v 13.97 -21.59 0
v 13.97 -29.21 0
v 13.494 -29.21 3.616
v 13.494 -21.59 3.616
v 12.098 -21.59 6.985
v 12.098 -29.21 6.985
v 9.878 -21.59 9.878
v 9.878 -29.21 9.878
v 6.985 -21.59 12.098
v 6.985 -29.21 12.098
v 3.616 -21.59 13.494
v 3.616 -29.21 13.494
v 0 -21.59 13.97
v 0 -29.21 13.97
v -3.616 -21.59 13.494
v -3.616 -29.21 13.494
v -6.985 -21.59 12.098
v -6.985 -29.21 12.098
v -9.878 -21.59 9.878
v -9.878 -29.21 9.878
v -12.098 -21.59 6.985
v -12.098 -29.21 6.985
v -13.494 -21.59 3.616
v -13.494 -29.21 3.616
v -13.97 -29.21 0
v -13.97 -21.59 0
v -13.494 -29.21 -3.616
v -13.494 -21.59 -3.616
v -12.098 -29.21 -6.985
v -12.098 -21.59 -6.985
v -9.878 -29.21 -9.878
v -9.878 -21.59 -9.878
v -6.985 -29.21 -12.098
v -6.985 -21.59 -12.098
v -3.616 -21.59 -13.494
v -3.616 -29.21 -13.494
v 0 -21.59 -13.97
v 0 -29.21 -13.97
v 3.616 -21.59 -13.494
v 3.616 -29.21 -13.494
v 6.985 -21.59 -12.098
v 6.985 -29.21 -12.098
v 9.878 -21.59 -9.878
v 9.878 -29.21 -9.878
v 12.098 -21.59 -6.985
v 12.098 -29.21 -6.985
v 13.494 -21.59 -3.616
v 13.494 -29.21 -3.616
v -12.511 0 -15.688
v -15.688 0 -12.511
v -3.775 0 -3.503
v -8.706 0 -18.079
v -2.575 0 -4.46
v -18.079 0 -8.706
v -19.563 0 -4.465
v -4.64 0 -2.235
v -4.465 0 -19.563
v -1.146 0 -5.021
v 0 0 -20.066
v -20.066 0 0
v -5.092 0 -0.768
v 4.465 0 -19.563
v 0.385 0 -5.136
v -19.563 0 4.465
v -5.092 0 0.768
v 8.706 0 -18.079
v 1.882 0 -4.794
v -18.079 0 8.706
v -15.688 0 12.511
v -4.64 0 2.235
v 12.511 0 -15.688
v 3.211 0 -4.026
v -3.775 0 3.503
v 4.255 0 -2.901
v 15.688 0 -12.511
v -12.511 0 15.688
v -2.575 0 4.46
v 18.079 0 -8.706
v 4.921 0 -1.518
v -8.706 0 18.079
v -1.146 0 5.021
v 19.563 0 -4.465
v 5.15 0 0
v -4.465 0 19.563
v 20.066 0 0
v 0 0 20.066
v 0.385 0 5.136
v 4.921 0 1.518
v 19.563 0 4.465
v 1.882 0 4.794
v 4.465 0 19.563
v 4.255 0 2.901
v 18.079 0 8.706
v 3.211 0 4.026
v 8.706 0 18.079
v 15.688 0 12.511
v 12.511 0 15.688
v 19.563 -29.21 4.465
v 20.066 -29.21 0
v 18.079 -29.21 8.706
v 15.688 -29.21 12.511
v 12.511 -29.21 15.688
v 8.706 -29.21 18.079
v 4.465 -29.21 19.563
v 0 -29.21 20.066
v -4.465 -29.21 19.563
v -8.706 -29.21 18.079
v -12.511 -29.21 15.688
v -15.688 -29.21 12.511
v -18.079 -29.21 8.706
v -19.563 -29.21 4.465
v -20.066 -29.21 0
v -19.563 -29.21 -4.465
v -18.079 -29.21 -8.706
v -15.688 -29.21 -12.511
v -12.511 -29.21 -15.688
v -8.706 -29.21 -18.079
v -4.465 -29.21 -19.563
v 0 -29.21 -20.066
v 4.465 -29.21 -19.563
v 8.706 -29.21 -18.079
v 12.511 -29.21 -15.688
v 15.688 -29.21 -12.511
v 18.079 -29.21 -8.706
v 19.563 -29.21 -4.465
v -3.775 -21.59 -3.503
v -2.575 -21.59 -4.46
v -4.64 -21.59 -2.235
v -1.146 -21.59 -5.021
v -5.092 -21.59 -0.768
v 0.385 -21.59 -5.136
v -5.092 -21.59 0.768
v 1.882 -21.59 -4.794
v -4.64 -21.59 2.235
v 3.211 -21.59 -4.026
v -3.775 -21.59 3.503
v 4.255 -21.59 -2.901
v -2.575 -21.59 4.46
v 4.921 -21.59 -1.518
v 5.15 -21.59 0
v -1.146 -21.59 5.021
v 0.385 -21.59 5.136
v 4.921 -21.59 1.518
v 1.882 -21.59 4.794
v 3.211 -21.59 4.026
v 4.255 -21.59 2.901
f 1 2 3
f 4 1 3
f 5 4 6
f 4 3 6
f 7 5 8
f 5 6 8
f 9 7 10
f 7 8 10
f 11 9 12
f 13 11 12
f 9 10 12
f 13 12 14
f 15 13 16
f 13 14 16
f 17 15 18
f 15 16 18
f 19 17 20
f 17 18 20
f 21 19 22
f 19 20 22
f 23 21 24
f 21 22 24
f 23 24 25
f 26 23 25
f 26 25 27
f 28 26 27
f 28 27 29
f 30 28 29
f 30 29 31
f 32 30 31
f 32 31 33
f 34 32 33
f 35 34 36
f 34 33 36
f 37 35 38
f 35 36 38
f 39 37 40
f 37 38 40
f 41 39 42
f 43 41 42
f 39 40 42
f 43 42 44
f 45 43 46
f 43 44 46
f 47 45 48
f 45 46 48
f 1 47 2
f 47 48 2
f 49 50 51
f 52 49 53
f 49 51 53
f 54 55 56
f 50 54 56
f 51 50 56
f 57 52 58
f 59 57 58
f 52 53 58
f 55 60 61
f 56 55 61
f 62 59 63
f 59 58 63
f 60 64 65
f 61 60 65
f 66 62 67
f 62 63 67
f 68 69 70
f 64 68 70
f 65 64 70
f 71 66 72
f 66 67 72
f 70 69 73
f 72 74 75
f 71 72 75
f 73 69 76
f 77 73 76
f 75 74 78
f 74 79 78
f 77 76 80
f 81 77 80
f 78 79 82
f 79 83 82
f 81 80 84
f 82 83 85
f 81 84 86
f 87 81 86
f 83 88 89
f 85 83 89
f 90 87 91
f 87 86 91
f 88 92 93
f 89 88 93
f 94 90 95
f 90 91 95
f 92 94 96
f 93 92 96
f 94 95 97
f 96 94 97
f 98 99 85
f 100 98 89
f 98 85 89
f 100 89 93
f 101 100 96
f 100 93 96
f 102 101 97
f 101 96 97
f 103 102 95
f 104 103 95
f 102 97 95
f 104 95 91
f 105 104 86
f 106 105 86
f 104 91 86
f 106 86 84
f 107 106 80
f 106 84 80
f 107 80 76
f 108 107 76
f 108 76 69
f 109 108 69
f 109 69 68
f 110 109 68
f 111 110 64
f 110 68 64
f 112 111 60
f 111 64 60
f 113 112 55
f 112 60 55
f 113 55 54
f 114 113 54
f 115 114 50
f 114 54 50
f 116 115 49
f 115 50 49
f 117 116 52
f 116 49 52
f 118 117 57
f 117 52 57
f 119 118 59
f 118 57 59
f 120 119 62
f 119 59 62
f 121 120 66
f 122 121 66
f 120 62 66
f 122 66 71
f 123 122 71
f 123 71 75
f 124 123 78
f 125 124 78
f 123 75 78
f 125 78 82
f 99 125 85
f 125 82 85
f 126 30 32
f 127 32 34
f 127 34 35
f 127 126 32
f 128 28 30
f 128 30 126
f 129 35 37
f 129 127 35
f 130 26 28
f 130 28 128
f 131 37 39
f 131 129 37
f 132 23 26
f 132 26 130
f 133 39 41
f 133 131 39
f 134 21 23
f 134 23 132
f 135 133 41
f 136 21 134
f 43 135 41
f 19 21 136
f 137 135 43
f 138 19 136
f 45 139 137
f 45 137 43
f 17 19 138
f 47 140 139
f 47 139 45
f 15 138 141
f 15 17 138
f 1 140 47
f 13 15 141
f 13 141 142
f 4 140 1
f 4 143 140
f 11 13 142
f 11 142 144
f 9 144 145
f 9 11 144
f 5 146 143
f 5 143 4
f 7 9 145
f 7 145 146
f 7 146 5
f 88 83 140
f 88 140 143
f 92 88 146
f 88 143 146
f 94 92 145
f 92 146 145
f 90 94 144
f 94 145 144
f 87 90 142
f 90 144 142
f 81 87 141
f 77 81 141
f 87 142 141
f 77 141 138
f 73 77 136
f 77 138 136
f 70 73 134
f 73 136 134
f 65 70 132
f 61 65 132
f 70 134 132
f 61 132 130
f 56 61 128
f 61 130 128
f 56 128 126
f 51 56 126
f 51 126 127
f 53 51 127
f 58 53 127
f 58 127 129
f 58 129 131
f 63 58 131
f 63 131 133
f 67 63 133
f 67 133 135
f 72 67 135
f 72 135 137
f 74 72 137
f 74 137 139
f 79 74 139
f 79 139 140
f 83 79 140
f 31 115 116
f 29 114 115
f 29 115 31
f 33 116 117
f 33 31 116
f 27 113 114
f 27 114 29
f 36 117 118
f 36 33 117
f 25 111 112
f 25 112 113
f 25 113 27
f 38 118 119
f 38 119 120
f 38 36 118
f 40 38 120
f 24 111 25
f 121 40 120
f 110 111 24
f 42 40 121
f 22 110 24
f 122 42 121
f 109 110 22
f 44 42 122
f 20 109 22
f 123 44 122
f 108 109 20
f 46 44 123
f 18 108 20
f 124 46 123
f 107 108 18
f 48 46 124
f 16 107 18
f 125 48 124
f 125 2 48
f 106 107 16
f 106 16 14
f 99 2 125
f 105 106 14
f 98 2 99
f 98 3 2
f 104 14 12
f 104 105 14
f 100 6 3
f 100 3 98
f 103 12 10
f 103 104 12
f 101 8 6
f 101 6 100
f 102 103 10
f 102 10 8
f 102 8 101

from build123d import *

# Parameters (mm, degrees)
F0_R     = 20.066
F1_DEPTH = 29.21
F2_R     = 13.97
F3_DEPTH = 7.62
F5_D     = 10.3


with BuildPart() as f1:
    # F0 (on Front) → F1 (new body)
    with BuildSketch(Plane.XZ):
        Circle(F0_R)
    extrude(amount=F1_DEPTH)

    # F2 (on face) → F3 (cut)
    with BuildSketch(Plane.XZ.offset(29.21)):
        Circle(F2_R)
    extrude(amount=-F3_DEPTH, mode=Mode.SUBTRACT)

    # F5 (through all)
    with Locations(Plane(origin=(0, 0, 0), x_dir=(-1, 0, 0), z_dir=(0, 1, 0))):
        with Locations((0, 0)):
            Hole(F5_D / 2)


solid = f1.part
